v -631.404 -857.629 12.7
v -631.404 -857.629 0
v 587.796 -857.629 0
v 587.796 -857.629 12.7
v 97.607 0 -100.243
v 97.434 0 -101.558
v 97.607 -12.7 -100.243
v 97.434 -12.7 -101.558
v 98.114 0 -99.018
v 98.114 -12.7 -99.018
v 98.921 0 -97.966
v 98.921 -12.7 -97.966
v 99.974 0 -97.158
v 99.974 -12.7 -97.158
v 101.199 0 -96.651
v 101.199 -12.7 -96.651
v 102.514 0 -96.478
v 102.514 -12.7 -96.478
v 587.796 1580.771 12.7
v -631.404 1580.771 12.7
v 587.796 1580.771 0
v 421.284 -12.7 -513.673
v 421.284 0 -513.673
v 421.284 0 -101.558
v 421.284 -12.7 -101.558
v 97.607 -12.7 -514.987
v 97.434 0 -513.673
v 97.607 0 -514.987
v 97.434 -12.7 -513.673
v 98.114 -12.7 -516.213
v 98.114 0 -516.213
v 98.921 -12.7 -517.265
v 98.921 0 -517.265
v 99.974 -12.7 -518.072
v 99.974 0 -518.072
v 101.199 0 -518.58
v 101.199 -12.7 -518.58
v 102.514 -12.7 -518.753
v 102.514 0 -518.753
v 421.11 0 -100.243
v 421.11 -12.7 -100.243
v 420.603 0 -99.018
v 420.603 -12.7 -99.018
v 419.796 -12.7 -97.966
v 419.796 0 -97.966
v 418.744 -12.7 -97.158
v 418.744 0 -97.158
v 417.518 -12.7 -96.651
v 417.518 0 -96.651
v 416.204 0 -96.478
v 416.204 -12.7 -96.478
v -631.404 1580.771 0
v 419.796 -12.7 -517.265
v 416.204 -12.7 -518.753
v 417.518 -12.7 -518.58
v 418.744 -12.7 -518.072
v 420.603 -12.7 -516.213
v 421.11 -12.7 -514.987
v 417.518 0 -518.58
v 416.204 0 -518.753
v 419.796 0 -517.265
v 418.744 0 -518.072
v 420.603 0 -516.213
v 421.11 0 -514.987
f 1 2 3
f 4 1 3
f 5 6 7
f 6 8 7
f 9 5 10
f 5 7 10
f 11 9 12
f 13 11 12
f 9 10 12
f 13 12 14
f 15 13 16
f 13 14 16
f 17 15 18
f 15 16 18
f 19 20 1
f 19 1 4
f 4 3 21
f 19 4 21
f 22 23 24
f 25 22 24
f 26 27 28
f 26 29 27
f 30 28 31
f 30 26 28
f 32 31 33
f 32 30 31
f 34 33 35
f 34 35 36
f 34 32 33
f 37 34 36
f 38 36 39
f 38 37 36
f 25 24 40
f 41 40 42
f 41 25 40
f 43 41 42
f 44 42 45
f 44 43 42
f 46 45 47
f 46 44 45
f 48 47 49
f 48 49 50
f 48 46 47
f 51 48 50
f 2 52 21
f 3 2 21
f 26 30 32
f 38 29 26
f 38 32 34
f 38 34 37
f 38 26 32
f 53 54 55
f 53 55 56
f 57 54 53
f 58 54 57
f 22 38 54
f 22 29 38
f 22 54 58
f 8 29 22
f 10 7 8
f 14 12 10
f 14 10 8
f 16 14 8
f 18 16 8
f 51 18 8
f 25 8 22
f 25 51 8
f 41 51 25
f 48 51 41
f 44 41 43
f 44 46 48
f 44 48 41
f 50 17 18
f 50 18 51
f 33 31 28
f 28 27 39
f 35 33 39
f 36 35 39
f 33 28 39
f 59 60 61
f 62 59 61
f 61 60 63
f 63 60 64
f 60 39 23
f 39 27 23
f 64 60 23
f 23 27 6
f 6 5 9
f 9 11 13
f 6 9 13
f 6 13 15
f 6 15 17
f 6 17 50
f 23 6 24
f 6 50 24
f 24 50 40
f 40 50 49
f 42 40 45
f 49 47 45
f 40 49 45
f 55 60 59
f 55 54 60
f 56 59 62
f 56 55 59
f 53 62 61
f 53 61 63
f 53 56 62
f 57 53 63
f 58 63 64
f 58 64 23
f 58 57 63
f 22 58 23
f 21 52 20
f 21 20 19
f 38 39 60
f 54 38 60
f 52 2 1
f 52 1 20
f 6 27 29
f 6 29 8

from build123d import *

# Parameters (mm, degrees)
F0_W     = 1219.2
F0_H     = 2438.4
F1_DEPTH = 12.7
F2_W     = 323.85
F2_H     = 422.275
F3_DEPTH = 12.7
F4_R     = 5.08


with BuildPart() as f1:
    # F0 (on Top) → F1 (new body)
    with BuildSketch(Plane.XY):
        with Locations((-21.803675, 361.570789)):
            Rectangle(F0_W, F0_H)
    extrude(amount=F1_DEPTH)


with BuildPart() as f3:
    # F2 (on Front) → F3 (new body)
    with BuildSketch(Plane.XZ):
        with Locations((259.358545, -307.615135)):
            Rectangle(F2_W, F2_H)
    extrude(amount=F3_DEPTH)

    # F4
    f4_edges = [f3.edges().sort_by_distance(p)[0] for p in [
        (421.283545, -6.35, -518.752635),
        (97.433545, -6.35, -518.752635),
        (97.433545, -6.35, -96.477635),
        (421.283545, -6.35, -96.477635),
    ]]
    fillet(f4_edges, radius=F4_R)


solid = Compound([f1.part, f3.part])
